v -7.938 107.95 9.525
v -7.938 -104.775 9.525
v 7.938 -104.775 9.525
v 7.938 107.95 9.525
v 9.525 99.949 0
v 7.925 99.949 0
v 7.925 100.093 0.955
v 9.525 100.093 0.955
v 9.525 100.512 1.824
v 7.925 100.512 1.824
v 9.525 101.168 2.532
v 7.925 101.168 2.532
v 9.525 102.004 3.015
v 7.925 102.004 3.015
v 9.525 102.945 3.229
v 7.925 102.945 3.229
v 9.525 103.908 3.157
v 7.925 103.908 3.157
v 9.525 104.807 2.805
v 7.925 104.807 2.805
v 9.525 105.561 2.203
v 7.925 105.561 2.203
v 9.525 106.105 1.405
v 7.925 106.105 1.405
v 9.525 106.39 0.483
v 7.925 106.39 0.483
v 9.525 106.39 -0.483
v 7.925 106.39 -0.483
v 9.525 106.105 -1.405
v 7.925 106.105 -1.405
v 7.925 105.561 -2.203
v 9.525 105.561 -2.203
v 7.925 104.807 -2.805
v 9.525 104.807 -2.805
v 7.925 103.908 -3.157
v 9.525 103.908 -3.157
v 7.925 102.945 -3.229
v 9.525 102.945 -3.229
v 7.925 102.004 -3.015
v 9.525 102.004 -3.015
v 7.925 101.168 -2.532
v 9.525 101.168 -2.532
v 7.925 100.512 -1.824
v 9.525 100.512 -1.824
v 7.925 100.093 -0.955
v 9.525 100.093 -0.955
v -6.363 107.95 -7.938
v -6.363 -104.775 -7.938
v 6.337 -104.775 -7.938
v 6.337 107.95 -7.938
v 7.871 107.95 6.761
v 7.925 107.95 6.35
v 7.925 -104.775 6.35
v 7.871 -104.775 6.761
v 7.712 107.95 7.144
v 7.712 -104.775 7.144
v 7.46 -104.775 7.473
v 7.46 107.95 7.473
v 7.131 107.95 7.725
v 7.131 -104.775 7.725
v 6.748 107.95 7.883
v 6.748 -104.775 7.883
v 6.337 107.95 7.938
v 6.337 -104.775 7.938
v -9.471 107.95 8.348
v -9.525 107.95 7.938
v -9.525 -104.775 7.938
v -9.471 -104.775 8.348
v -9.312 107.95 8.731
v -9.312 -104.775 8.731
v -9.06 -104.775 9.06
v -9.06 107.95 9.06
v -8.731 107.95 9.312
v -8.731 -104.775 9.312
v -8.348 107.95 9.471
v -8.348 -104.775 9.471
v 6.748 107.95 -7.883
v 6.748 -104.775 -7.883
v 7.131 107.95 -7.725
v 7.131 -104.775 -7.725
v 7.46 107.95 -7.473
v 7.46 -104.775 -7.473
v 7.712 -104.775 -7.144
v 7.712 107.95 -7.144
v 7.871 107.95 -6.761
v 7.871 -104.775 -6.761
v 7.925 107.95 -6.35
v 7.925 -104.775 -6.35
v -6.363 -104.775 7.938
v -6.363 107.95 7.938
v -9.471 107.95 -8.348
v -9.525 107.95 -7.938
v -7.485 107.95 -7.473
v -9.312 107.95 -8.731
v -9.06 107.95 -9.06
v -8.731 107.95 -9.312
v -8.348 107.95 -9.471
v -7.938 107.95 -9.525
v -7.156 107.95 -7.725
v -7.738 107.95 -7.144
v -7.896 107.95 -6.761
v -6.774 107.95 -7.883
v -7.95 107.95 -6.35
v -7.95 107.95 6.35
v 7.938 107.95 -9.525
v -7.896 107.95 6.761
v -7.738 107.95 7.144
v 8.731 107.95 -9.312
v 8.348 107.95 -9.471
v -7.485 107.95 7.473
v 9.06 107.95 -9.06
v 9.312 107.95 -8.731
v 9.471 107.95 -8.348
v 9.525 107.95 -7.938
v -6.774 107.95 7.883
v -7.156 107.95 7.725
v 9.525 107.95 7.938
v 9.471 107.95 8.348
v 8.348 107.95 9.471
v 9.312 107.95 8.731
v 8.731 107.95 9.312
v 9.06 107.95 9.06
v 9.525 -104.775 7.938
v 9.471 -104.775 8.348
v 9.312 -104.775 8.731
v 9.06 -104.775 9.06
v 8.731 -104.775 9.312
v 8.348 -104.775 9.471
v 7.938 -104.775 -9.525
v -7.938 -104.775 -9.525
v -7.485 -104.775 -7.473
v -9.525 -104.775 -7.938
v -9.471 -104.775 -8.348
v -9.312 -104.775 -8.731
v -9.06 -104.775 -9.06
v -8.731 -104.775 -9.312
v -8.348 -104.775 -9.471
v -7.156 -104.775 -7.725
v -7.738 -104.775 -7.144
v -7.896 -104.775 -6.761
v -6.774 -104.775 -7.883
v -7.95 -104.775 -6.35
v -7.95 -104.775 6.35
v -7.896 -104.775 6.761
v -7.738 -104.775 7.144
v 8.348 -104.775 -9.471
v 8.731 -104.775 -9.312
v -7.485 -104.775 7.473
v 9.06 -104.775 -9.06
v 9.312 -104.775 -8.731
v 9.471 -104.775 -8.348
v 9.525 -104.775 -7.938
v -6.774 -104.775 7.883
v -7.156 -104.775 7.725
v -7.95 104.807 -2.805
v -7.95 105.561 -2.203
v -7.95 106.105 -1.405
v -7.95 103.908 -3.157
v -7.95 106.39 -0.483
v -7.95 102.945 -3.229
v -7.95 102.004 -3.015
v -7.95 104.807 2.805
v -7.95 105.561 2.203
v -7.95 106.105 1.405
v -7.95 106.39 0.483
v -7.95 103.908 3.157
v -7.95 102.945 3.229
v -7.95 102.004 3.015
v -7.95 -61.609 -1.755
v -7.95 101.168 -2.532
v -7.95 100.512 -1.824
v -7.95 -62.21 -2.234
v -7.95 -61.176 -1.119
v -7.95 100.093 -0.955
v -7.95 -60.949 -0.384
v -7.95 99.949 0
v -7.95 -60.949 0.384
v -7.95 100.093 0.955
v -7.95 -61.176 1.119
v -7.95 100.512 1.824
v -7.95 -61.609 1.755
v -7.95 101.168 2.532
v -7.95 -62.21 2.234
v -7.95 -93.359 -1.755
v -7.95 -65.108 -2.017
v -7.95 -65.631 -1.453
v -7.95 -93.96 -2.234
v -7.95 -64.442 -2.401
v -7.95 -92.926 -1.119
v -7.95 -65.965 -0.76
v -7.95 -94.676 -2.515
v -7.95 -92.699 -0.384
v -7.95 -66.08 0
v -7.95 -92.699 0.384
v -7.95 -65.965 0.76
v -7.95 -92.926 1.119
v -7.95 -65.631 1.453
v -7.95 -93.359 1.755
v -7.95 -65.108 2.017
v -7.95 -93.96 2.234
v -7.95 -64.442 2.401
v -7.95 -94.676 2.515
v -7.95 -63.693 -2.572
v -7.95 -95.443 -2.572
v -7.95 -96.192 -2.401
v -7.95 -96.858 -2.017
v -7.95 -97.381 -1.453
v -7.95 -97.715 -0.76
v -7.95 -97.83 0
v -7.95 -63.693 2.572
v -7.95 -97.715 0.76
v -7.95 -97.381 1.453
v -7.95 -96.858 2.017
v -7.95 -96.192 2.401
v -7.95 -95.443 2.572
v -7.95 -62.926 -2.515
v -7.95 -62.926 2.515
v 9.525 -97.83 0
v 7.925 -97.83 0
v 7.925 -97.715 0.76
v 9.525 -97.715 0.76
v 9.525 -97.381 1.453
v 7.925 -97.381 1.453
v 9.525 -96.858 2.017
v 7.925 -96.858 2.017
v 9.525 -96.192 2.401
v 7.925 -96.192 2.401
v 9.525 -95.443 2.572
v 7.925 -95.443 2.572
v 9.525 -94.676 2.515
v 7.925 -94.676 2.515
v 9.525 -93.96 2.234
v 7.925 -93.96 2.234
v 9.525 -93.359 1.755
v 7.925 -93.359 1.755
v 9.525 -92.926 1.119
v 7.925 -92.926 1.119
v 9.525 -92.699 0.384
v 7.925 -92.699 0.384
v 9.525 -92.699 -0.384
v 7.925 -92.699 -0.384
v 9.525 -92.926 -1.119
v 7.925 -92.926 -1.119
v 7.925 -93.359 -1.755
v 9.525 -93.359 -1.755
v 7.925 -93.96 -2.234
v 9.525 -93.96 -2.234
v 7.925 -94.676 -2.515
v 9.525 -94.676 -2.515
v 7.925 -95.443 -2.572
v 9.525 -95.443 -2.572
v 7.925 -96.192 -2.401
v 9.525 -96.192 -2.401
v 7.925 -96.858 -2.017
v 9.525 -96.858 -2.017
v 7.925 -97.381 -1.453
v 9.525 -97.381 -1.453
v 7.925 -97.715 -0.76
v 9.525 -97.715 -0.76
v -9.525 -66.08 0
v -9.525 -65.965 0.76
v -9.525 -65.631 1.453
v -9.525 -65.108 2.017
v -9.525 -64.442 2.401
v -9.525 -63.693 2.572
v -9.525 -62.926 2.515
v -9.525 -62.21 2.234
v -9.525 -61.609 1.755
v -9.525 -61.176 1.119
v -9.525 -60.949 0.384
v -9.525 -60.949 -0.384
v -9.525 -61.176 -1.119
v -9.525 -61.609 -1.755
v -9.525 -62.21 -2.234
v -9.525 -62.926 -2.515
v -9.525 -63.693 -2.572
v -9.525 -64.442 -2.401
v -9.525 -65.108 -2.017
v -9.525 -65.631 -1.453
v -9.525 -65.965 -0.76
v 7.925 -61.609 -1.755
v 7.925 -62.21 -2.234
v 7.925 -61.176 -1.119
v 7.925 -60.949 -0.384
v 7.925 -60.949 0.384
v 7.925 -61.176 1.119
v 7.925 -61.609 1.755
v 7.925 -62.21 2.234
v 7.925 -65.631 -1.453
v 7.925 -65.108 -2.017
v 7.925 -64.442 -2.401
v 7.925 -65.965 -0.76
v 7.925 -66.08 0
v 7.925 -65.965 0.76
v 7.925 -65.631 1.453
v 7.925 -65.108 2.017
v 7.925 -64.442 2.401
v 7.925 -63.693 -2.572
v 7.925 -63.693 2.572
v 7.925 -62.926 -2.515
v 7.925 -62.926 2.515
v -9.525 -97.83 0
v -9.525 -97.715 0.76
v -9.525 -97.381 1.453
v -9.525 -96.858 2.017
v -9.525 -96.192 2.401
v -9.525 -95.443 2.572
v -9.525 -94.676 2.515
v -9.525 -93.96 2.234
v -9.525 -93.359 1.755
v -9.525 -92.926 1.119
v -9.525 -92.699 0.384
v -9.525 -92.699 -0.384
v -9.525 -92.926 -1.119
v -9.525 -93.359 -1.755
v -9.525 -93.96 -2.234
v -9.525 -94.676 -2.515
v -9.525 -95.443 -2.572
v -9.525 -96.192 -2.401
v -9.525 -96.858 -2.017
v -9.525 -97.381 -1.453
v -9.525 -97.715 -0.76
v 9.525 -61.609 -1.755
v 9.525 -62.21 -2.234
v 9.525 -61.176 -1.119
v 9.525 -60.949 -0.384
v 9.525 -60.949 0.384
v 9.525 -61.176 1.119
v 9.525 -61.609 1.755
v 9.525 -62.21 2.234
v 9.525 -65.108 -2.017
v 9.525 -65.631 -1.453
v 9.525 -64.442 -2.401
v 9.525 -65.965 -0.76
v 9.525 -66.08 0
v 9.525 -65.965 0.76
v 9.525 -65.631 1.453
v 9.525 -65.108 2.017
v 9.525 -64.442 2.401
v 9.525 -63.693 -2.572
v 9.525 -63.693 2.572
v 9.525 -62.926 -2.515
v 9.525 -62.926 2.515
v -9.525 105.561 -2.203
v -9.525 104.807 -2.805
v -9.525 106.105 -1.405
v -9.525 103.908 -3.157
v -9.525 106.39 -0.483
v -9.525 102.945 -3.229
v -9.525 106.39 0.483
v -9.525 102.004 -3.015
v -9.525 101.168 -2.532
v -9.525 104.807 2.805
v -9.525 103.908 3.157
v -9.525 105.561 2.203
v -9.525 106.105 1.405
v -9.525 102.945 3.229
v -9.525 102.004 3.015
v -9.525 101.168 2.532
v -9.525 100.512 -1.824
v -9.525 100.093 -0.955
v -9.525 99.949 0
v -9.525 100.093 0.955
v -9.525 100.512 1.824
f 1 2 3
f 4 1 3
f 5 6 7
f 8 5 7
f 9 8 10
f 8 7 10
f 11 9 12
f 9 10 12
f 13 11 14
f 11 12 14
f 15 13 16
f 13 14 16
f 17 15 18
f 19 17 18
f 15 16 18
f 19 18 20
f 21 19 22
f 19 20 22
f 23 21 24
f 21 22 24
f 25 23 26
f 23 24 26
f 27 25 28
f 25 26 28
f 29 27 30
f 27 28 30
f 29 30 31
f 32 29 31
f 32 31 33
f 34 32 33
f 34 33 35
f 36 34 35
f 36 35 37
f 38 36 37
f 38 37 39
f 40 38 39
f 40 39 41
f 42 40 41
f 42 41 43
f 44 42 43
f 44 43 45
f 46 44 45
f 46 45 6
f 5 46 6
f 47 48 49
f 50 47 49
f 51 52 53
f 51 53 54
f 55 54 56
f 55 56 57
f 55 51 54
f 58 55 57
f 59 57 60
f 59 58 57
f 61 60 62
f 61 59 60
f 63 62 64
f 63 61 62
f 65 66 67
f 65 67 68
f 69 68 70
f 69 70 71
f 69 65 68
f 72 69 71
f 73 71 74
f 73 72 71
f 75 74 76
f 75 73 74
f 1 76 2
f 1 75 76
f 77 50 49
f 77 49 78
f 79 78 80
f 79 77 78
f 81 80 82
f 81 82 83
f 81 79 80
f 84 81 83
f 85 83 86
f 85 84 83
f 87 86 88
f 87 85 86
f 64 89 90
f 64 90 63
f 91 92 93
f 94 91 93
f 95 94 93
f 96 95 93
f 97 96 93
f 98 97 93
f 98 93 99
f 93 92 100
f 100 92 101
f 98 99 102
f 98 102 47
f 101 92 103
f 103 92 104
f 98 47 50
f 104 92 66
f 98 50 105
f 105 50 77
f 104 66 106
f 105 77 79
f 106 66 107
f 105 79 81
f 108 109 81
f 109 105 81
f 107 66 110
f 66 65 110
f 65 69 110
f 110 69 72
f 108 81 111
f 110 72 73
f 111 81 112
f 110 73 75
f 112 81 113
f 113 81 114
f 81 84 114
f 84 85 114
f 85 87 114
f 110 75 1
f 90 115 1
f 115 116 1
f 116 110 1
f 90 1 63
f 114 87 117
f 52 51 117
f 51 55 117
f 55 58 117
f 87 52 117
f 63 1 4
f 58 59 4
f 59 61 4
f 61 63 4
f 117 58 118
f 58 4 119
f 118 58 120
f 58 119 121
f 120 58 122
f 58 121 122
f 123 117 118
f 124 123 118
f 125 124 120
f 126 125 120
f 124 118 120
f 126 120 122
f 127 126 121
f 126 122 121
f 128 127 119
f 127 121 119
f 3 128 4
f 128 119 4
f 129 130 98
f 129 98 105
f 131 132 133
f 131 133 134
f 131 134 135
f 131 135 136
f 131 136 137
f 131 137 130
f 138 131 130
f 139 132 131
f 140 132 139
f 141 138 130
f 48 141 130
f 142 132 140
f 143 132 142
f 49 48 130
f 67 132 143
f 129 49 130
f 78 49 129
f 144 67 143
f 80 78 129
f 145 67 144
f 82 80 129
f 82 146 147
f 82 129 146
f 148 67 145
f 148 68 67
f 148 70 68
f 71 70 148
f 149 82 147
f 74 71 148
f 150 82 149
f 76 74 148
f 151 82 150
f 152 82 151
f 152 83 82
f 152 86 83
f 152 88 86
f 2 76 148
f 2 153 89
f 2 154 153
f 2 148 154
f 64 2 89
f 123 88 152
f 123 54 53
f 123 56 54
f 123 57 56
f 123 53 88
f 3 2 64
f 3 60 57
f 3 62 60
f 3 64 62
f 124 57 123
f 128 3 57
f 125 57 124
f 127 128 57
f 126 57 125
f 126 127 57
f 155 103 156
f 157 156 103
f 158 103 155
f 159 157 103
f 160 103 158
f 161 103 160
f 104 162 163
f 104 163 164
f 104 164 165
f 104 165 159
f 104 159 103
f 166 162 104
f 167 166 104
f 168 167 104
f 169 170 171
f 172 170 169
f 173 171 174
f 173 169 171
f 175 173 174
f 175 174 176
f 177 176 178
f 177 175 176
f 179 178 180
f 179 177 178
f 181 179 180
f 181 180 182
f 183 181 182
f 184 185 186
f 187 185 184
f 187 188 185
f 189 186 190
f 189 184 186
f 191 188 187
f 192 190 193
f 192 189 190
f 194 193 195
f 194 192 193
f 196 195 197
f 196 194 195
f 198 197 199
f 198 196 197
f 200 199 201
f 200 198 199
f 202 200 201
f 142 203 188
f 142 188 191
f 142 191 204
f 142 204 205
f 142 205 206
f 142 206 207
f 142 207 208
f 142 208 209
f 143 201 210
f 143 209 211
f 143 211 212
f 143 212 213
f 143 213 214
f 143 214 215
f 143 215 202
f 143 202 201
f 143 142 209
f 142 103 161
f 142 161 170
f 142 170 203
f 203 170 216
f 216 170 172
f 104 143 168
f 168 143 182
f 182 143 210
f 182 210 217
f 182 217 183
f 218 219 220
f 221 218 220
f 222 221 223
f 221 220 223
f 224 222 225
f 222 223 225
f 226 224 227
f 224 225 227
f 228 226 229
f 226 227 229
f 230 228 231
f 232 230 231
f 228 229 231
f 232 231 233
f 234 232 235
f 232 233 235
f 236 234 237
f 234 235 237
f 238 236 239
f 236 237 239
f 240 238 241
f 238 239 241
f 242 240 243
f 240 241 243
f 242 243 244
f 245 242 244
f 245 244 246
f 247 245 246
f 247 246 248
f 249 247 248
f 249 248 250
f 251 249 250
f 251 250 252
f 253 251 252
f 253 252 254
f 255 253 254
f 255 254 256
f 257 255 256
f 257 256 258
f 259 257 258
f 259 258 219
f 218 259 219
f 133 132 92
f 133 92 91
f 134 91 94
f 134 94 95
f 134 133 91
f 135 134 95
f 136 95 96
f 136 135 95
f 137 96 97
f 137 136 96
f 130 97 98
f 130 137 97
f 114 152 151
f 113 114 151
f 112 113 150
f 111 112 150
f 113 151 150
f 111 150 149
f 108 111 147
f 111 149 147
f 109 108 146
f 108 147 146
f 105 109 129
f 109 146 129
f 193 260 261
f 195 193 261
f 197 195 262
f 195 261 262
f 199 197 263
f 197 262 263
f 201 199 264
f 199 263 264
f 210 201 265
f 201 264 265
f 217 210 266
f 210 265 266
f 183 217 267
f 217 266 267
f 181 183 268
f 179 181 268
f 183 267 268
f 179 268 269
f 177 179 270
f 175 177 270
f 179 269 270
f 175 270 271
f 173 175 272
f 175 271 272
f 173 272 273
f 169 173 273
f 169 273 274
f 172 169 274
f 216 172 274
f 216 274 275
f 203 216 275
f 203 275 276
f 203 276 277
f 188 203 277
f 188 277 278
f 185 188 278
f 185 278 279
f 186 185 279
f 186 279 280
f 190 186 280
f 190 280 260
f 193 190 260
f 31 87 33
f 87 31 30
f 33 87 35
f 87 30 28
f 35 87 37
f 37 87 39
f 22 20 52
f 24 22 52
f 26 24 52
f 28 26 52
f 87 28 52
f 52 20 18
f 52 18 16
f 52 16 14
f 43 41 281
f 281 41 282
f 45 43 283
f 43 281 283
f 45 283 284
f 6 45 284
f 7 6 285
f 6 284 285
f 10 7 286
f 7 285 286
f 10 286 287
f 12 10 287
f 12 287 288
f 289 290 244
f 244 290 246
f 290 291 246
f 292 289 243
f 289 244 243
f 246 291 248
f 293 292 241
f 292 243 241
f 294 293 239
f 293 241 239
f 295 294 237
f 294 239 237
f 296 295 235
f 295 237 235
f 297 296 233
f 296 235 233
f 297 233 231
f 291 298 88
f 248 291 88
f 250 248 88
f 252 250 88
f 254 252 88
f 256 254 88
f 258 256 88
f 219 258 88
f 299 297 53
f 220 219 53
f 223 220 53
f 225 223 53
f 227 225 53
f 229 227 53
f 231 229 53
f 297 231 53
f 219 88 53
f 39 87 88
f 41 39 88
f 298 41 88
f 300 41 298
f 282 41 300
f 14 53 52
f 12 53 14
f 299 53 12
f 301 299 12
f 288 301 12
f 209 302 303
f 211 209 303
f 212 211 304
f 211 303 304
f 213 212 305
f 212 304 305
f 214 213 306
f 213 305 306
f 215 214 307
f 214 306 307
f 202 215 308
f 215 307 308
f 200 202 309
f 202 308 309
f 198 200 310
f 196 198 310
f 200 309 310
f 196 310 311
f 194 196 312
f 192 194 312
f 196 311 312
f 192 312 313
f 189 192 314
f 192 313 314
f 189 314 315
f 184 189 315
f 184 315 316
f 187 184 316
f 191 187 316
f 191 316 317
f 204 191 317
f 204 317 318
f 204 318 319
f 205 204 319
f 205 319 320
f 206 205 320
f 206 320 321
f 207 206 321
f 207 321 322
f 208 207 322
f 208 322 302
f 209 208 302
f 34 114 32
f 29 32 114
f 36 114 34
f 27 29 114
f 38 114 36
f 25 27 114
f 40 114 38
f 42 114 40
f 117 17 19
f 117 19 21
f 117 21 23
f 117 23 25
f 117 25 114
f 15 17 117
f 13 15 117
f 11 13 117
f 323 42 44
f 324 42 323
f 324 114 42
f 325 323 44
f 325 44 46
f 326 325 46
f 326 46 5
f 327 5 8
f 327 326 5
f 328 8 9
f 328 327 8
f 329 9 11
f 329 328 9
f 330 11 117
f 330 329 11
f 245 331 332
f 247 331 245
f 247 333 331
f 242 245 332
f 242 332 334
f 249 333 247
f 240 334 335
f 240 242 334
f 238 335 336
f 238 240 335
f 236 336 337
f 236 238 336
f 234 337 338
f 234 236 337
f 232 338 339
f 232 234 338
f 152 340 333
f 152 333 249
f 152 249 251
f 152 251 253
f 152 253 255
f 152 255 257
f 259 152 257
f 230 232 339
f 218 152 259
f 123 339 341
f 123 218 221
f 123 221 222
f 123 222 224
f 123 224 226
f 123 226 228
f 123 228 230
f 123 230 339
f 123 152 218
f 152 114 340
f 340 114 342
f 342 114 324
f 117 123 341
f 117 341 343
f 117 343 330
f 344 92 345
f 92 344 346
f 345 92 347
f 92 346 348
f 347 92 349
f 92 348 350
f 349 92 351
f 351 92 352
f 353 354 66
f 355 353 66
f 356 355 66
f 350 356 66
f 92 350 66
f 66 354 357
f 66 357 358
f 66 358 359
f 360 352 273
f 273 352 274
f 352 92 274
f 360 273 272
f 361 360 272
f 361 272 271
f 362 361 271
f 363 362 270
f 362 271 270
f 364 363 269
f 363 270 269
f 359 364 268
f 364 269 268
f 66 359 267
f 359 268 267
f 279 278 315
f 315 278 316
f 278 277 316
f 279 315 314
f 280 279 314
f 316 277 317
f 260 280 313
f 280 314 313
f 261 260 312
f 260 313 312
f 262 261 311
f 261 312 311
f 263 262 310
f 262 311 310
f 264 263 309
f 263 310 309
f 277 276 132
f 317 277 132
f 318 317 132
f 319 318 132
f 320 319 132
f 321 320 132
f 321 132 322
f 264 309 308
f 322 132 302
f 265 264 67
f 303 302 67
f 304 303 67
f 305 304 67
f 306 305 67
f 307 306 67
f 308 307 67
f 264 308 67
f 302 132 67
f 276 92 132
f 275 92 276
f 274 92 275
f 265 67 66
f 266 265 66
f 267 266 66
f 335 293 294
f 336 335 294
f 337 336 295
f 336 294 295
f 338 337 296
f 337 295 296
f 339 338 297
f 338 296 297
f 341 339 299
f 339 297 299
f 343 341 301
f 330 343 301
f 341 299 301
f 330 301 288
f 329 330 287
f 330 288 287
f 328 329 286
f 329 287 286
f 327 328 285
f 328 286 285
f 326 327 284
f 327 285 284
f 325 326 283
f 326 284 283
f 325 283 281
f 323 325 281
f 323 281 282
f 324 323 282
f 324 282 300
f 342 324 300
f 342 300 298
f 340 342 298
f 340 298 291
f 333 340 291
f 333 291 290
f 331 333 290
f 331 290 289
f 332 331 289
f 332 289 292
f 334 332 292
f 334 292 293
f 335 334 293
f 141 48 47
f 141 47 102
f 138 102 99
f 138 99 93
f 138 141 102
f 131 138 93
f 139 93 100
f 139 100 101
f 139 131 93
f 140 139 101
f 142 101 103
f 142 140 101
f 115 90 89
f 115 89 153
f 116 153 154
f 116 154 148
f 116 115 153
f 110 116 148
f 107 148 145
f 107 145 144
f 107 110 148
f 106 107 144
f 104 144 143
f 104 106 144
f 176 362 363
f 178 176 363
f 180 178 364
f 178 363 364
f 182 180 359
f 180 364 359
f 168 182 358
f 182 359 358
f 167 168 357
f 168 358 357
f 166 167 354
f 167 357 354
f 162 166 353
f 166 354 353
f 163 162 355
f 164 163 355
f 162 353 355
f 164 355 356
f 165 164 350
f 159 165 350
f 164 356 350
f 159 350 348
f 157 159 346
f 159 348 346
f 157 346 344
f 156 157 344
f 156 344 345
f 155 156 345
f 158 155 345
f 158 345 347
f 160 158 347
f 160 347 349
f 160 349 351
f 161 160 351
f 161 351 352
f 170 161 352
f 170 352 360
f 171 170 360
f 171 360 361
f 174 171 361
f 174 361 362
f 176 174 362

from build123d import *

# Parameters (mm, degrees)
F0_W     = 19.05
F0_H     = 19.05
F0_W_2   = 15.875
F0_H_2   = 15.875
F1_DEPTH = 107.95
F2_R     = 1.5875
F3_R     = 1.5875
F4_R     = 3.2385
F4_R_2   = 2.5796875
F5_DEPTH = 19.05
F6_DEPTH = 3.175


# Not quite as in the source:
# - a length typed as a fraction of an inch, garbled in the dataset ("3 / 203.2 mm" for 3/8 in), is restored


with BuildPart() as f1:
    # F0 (on Front) → F1 (new body, symmetric)
    with BuildSketch(Plane.XZ):
        Rectangle(F0_W, F0_H)
        with Locations((-0.0127, 0)):
            Rectangle(F0_W_2, F0_H_2, mode=Mode.SUBTRACT)
    extrude(amount=F1_DEPTH, both=True)

    # F2
    f2_edges = [f1.edges().sort_by_distance(p)[0] for p in [
        (-9.525, 0, 9.525),
        (-9.525, 0, -9.525),
        (9.525, 0, -9.525),
        (9.525, 0, 9.525),
    ]]
    fillet(f2_edges, radius=F2_R)

    # F3
    f3_edges = [f1.edges().sort_by_distance(p)[0] for p in [
        (-7.9502, 0, 7.9375),
        (-7.9502, 0, -7.9375),
        (7.9248, 0, 7.9375),
        (7.9248, 0, -7.9375),
    ]]
    fillet(f3_edges, radius=F3_R)

    # F4 (on face) → F5 (cut)
    with BuildSketch(Plane(origin=(-9.525, 0, 0), x_dir=(0, -1, 0), z_dir=(-1, 0, 0))):
        with Locations((-103.1875, 0)):
            Circle(F4_R)
        with Locations((63.5, 0)):
            Circle(F4_R_2)
        with Locations((95.25, 0)):
            Circle(F4_R_2)
    extrude(amount=-F5_DEPTH, mode=Mode.SUBTRACT)

    # F6 (cut): a face of the model
    f6_faces = [f1.faces().sort_by_distance(p)[0] for p in [
        (-8.2196076836, -107.95, 0),
    ]]
    extrude(f6_faces, amount=-F6_DEPTH, mode=Mode.SUBTRACT)


solid = f1.part
